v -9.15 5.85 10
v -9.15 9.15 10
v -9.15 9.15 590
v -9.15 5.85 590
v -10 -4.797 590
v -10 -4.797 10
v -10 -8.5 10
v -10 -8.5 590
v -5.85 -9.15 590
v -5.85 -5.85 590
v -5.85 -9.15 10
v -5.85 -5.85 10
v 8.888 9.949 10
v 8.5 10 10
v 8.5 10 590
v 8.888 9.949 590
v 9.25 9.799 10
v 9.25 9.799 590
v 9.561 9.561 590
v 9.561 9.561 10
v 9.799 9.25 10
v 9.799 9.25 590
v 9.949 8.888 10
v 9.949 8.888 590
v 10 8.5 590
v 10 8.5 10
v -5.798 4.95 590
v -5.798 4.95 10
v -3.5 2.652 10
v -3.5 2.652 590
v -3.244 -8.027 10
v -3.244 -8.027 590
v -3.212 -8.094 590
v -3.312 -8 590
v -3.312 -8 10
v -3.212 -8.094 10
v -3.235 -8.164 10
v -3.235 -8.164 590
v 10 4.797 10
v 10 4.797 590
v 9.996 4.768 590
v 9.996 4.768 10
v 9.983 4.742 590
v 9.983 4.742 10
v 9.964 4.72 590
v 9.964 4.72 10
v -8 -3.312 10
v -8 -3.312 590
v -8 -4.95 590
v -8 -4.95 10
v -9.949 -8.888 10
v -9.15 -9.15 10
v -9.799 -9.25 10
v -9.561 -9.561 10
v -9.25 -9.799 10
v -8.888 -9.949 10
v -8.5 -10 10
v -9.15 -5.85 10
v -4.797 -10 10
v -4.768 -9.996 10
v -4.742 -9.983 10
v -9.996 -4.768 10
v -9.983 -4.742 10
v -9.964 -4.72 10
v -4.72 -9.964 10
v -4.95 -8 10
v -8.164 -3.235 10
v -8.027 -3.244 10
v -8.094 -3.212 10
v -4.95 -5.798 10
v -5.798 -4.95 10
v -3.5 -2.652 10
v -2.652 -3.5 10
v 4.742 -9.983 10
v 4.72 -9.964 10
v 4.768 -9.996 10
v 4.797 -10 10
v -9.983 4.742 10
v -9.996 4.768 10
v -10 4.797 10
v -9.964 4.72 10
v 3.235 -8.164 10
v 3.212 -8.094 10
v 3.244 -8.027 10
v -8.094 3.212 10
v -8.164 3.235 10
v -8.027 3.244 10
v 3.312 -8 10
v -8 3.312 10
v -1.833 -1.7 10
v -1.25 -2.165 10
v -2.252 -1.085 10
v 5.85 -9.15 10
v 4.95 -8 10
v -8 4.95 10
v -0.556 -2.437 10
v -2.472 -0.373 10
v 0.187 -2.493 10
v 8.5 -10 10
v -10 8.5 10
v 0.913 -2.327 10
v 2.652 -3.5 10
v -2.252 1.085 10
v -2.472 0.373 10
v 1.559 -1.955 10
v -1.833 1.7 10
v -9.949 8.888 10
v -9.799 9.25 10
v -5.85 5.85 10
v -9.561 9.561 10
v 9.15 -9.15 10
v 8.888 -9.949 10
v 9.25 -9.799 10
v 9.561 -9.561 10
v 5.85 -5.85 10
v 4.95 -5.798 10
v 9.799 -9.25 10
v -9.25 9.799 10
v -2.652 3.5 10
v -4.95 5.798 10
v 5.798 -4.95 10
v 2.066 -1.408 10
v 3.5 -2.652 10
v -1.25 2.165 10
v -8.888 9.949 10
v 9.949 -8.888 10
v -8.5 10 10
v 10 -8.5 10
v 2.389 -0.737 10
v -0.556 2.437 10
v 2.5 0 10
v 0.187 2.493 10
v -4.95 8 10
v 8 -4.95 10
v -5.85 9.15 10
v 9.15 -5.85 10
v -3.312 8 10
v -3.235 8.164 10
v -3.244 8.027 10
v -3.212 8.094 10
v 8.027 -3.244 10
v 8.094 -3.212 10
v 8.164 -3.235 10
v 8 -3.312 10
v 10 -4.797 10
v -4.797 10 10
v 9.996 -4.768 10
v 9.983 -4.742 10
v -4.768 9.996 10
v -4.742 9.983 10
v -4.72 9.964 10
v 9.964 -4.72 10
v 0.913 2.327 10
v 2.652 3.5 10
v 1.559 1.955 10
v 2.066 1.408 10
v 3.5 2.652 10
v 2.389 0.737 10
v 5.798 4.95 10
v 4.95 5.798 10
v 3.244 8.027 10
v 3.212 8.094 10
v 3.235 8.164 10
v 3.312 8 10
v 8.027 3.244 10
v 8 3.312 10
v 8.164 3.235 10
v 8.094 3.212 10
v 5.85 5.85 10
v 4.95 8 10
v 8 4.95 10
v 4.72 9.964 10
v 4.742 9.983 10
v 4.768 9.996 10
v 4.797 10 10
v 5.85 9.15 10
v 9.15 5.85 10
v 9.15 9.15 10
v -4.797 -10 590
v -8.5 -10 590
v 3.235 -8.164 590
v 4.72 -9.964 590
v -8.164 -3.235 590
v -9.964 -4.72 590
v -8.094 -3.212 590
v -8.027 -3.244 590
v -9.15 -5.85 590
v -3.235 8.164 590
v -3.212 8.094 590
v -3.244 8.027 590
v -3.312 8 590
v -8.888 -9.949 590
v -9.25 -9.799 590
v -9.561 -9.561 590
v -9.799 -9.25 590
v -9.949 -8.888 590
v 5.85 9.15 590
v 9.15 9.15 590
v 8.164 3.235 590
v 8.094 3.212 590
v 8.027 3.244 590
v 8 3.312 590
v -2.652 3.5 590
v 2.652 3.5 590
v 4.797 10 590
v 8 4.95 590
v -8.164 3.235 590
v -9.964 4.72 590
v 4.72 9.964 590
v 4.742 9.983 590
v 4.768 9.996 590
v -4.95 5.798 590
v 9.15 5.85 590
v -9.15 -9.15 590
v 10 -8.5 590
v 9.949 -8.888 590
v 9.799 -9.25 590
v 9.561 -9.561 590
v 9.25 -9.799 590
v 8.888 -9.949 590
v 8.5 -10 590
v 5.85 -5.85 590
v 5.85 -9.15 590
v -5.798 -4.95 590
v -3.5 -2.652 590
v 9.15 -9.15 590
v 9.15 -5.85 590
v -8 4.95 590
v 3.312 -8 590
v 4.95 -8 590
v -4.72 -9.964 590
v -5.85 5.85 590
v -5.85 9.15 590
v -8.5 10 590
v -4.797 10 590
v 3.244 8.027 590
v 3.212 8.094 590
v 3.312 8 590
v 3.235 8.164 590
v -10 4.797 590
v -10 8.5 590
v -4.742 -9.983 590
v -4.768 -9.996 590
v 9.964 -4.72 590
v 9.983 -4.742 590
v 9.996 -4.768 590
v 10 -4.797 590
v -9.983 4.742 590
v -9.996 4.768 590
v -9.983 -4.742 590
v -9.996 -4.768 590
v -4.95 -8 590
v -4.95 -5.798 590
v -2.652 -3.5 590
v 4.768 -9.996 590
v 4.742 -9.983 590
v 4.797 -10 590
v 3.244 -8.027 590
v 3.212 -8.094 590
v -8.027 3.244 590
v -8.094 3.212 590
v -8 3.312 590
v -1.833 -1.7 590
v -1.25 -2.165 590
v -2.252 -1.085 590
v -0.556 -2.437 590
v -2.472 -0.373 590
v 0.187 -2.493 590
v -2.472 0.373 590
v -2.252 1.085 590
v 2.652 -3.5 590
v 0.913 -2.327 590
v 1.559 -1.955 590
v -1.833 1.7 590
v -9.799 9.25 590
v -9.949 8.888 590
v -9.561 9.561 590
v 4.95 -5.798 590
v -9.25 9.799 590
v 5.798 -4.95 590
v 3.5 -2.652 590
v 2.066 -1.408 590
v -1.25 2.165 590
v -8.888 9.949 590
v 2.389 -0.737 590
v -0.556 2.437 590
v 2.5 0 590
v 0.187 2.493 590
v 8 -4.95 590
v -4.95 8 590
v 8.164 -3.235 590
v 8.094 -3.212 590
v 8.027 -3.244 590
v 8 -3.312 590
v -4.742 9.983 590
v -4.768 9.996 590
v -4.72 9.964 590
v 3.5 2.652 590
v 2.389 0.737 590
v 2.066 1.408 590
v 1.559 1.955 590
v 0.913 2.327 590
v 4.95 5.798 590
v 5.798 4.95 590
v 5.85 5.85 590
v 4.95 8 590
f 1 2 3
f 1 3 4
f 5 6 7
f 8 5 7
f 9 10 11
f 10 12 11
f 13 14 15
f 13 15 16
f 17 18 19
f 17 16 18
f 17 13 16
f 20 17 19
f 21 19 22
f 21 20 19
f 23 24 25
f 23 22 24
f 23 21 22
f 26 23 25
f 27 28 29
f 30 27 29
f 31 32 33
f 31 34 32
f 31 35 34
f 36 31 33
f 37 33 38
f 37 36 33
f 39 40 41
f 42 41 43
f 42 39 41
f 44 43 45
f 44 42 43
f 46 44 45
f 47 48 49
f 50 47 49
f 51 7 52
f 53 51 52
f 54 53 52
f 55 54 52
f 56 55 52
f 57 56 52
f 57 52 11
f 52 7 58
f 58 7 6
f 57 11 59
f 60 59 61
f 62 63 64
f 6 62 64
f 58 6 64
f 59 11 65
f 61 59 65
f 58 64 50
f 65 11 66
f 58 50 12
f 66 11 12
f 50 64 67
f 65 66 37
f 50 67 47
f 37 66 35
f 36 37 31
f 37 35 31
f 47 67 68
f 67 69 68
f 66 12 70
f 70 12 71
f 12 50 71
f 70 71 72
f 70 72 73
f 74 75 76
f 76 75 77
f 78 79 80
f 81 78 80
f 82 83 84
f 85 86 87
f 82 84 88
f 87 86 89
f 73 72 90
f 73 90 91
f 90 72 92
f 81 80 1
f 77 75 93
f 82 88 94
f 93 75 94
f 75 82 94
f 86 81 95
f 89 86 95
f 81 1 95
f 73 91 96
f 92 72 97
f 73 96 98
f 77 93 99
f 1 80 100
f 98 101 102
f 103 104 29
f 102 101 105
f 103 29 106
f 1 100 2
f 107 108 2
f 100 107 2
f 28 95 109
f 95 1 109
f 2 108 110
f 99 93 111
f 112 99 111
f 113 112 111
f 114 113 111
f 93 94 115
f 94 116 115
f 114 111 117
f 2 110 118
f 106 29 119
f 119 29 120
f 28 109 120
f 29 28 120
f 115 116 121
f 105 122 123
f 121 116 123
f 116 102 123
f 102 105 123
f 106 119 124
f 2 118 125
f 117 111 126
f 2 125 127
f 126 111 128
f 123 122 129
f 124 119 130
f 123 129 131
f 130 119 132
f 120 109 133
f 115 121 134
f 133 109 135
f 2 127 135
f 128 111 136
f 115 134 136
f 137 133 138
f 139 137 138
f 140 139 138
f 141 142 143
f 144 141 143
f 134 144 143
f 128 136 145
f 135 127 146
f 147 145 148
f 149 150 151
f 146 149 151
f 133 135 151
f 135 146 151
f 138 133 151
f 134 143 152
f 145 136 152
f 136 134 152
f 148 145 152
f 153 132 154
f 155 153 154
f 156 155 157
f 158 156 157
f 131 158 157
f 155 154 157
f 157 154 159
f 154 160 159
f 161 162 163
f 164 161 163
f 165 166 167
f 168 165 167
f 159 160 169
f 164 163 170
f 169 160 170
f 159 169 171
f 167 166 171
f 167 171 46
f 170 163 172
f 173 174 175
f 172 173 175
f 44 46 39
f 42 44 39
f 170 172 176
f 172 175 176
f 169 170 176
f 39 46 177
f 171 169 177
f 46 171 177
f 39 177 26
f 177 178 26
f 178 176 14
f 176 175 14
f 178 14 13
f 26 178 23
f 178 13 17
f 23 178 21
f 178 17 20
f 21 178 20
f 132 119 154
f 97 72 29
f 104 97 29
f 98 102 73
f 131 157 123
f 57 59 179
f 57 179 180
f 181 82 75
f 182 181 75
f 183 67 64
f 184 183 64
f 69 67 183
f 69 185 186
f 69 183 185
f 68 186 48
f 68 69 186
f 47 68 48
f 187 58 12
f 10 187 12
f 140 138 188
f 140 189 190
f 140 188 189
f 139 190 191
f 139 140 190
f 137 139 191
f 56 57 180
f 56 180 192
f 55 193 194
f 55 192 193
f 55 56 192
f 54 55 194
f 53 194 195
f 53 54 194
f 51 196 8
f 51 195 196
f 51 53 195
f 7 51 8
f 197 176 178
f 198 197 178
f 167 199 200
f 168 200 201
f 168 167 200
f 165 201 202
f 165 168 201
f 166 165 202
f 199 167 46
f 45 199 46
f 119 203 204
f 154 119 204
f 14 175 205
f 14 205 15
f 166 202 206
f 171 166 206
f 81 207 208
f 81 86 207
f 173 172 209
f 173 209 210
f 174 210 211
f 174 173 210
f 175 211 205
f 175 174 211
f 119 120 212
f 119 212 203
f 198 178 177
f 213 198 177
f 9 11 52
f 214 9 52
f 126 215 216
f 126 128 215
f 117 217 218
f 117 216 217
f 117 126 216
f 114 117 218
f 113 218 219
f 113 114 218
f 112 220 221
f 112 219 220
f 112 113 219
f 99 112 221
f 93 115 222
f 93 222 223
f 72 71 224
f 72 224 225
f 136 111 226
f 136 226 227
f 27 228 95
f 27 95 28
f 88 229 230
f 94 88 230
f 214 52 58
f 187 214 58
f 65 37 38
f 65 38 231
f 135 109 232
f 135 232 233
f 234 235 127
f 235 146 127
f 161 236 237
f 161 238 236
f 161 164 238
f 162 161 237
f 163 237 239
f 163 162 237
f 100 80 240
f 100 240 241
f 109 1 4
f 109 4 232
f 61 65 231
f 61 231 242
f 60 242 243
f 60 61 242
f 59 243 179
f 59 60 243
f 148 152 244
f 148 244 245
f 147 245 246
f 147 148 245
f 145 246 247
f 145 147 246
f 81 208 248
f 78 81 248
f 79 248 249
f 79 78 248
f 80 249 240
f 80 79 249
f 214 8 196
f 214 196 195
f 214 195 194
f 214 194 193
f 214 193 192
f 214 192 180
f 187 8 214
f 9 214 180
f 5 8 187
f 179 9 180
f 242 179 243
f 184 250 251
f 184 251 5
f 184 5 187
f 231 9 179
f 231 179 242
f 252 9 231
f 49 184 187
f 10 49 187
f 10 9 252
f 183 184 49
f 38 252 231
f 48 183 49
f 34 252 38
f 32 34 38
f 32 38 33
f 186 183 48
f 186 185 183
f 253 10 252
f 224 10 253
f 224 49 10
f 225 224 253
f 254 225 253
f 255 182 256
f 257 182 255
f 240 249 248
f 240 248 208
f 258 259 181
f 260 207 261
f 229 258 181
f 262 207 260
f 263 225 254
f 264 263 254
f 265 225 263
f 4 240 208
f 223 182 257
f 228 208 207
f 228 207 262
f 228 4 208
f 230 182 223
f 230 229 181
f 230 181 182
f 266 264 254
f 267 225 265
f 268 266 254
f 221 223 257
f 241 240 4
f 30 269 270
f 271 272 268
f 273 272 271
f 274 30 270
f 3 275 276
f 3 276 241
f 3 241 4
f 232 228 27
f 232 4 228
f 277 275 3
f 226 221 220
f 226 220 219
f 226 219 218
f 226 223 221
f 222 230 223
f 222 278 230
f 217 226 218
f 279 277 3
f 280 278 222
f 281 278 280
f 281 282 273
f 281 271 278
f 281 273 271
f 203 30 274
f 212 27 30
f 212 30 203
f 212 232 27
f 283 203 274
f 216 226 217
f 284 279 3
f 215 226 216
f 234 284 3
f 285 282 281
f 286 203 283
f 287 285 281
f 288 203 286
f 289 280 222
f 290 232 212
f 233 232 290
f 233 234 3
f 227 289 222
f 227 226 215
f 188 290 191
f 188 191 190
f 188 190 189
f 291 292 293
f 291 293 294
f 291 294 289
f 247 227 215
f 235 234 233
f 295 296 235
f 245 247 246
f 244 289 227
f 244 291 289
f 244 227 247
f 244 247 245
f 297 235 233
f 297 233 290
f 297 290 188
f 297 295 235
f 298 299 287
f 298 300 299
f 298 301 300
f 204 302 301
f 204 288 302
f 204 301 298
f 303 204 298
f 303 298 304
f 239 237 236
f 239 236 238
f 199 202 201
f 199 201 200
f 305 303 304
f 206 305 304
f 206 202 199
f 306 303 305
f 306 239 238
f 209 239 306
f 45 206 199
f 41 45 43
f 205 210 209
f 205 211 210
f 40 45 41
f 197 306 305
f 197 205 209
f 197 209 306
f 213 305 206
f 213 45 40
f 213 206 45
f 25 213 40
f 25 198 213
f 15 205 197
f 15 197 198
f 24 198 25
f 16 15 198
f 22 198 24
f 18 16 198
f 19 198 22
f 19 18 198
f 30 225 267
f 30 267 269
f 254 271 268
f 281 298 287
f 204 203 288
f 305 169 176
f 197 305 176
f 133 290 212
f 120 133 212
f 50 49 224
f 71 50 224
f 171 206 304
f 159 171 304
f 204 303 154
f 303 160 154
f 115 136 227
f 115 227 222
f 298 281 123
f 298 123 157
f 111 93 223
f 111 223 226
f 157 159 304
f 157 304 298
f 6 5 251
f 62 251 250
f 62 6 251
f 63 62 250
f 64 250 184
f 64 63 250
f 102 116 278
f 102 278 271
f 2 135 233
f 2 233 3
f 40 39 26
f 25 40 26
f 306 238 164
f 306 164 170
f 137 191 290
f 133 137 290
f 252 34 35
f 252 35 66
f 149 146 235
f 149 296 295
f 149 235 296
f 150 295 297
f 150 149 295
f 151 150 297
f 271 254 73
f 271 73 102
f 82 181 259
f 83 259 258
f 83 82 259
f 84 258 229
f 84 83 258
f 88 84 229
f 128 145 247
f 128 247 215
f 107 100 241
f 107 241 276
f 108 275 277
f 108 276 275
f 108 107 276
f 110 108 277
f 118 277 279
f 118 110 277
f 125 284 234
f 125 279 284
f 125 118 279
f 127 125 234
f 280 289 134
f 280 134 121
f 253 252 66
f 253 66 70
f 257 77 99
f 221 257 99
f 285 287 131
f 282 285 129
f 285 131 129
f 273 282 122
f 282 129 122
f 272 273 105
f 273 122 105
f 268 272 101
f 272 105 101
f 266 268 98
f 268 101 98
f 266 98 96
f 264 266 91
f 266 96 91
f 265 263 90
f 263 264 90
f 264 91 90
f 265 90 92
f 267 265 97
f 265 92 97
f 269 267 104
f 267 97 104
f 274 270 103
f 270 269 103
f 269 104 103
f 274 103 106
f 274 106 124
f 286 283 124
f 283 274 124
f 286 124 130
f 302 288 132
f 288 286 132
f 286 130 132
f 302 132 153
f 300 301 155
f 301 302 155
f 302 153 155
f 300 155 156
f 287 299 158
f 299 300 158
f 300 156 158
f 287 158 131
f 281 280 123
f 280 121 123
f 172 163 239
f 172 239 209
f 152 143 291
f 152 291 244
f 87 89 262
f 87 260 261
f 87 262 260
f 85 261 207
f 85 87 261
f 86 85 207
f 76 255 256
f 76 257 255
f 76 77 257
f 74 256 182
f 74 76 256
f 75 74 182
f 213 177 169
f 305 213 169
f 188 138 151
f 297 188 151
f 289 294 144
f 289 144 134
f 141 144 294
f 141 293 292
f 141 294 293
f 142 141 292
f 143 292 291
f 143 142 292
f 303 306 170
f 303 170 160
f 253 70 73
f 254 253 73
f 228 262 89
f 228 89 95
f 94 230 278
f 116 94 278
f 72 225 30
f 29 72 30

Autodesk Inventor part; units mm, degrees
ref_plane "Начальная плоскость" through (0, 0, 10) normal (0, 0, 1) x (1, 0, 0)
ref_plane "Конечная плоскость" through (0, 0, 590) normal (0, 0, 1) x (1, 0, 0)
sketch "Эскиз" plane through (0, 0, 0) normal (0, 0, 1) x (1, 0, 0)
  line L0 (-14.4349, 0) -> (14.4349, 0) projected
  line L1 (0, -14) -> (0, 14) projected
  line L2 (0, 0) -> (7.5, 7.5) construction
  circle A0 centre (7.5, 7.5) radius 1.65 construction
  line L3 (5.85, 9.15) -> (9.15, 9.15)
  line L4 (9.15, 9.15) -> (9.15, 5.85)
  line L5 (9.15, 5.85) -> (5.85, 5.85)
  line L6 (5.85, 5.85) -> (5.85, 9.15)
  line L7 (3.235, 8.1636) -> (4.72, 9.9636)
  line L8 (4.7971, 10) -> (8.5, 10)
  line L9 (3.3121, 8) -> (4.95, 8)
  line L10 (4.95, 8) -> (4.95, 5.7985)
  line L11 (4.95, 5.7985) -> (2.6515, 3.5)
  line L12 (0, 3.5) -> (2.6515, 3.5)
  circle A1 centre (0, 0) radius 2.5
  line L13 (8.1636, 3.235) -> (9.9636, 4.72)
  line L14 (10, 4.7971) -> (10, 8.5)
  line L15 (8, 3.3121) -> (8, 4.95)
  line L16 (8, 4.95) -> (5.7985, 4.95)
  line L17 (5.7985, 4.95) -> (3.5, 2.6515)
  line L18 (3.5, 0) -> (3.5, 2.6515)
  arc A2 (10, 8.5) -> (8.5, 10) centre (8.5, 8.5) ccw
  line L19 (0, 0) -> (-7.5, 7.5) construction
  circle A3 centre (-7.5, 7.5) radius 1.65 construction
  line L20 (-5.85, 9.15) -> (-9.15, 9.15)
  line L21 (-9.15, 9.15) -> (-9.15, 5.85)
  line L22 (-9.15, 5.85) -> (-5.85, 5.85)
  line L23 (-5.85, 5.85) -> (-5.85, 9.15)
  line L24 (-3.235, 8.1636) -> (-4.72, 9.9636)
  line L25 (-4.7971, 10) -> (-8.5, 10)
  line L26 (-3.3121, 8) -> (-4.95, 8)
  line L27 (-4.95, 8) -> (-4.95, 5.7985)
  line L28 (-4.95, 5.7985) -> (-2.6515, 3.5)
  line L29 (0, 3.5) -> (-2.6515, 3.5)
  line L30 (-3.5, 0) -> (-3.5, 2.6515)
  line L31 (-5.7985, 4.95) -> (-3.5, 2.6515)
  line L32 (-8, 4.95) -> (-5.7985, 4.95)
  line L33 (-8, 3.3121) -> (-8, 4.95)
  line L34 (-8.1636, 3.235) -> (-9.9636, 4.72)
  line L35 (-10, 4.7971) -> (-10, 8.5)
  arc A4 (-8.5, 10) -> (-10, 8.5) centre (-8.5, 8.5) ccw
  line L36 (0, 14) -> (0, -14)
  line L37 (0, 0) -> (7.5, -7.5) construction
  circle A5 centre (7.5, -7.5) radius 1.65 construction
  line L38 (5.85, -9.15) -> (9.15, -9.15)
  line L39 (9.15, -9.15) -> (9.15, -5.85)
  line L40 (9.15, -5.85) -> (5.85, -5.85)
  line L41 (5.85, -5.85) -> (5.85, -9.15)
  line L42 (3.235, -8.1636) -> (4.72, -9.9636)
  line L43 (4.7971, -10) -> (8.5, -10)
  line L44 (3.3121, -8) -> (4.95, -8)
  line L45 (4.95, -8) -> (4.95, -5.7985)
  line L46 (4.95, -5.7985) -> (2.6515, -3.5)
  line L47 (0, -3.5) -> (2.6515, -3.5)
  line L48 (3.5, 0) -> (3.5, -2.6515)
  line L49 (5.7985, -4.95) -> (3.5, -2.6515)
  line L50 (8, -4.95) -> (5.7985, -4.95)
  line L51 (8, -3.3121) -> (8, -4.95)
  line L52 (8.1636, -3.235) -> (9.9636, -4.72)
  line L53 (10, -4.7971) -> (10, -8.5)
  arc A6 (8.5, -10) -> (10, -8.5) centre (8.5, -8.5) ccw
  line L54 (0, 0) -> (-7.5, -7.5) construction
  line L55 (-4.95, -8) -> (-4.95, -5.7985)
  line L56 (-3.3121, -8) -> (-4.95, -8)
  line L57 (-5.7985, -4.95) -> (-3.5, -2.6515)
  line L58 (-4.95, -5.7985) -> (-2.6515, -3.5)
  line L59 (-3.5, 0) -> (-3.5, -2.6515)
  line L60 (0, -3.5) -> (-2.6515, -3.5)
  circle A7 centre (-7.5, -7.5) radius 1.65 construction
  line L61 (-5.85, -5.85) -> (-5.85, -9.15)
  line L62 (-5.85, -9.15) -> (-9.15, -9.15)
  line L63 (-9.15, -9.15) -> (-9.15, -5.85)
  line L64 (-9.15, -5.85) -> (-5.85, -5.85)
  line L65 (-3.235, -8.1636) -> (-4.72, -9.9636)
  line L66 (-8, -4.95) -> (-5.7985, -4.95)
  line L67 (-8, -3.3121) -> (-8, -4.95)
  line L68 (-8.1636, -3.235) -> (-9.9636, -4.72)
  line L69 (-4.7971, -10) -> (-8.5, -10)
  line L70 (-10, -4.7971) -> (-10, -8.5)
  arc A8 (-10, -8.5) -> (-8.5, -10) centre (-8.5, -8.5) ccw
  arc A9 (3.235, 8.1636) -> (3.3121, 8) centre (3.3121, 8.1) ccw
  arc A10 (4.7971, 10) -> (4.72, 9.9636) centre (4.7971, 9.9) ccw
  arc A11 (8, 3.3121) -> (8.1636, 3.235) centre (8.1, 3.3121) ccw
  arc A12 (9.9636, 4.72) -> (10, 4.7971) centre (9.9, 4.7971) ccw
  arc A13 (-3.3121, 8) -> (-3.235, 8.1636) centre (-3.3121, 8.1) ccw
  arc A14 (-4.72, 9.9636) -> (-4.7971, 10) centre (-4.7971, 9.9) ccw
  arc A15 (-8.1636, 3.235) -> (-8, 3.3121) centre (-8.1, 3.3121) ccw
  arc A16 (-10, 4.7971) -> (-9.9636, 4.72) centre (-9.9, 4.7971) ccw
  arc A17 (-8, -3.3121) -> (-8.1636, -3.235) centre (-8.1, -3.3121) ccw
  arc A18 (-9.9636, -4.72) -> (-10, -4.7971) centre (-9.9, -4.7971) ccw
  arc A19 (-3.235, -8.1636) -> (-3.3121, -8) centre (-3.3121, -8.1) ccw
  arc A20 (-4.7971, -10) -> (-4.72, -9.9636) centre (-4.7971, -9.9) ccw
  arc A21 (4.72, -9.9636) -> (4.7971, -10) centre (4.7971, -9.9) ccw
  arc A22 (3.3121, -8) -> (3.235, -8.1636) centre (3.3121, -8.1) ccw
  arc A23 (8.1636, -3.235) -> (8, -3.3121) centre (8.1, -3.3121) ccw
  arc A24 (10, -4.7971) -> (9.9636, -4.72) centre (9.9, -4.7971) ccw
  point P0 (3.1, 8)
  point P1 (4.75, 10)
  point P2 (7.5, 9.15)
  point P3 (8, 3.1)
  point P4 (10, 4.75)
  point P5 (7.5, 5.85)
  point P6 (9.15, 7.5)
  point P7 (-3.1, 8)
  point P8 (-4.75, 10)
  point P9 (-7.5, 9.15)
  point P10 (-8, 3.1)
  point P11 (-10, 4.75)
  point P12 (-7.5, 5.85)
  point P13 (-9.15, 7.5)
  point P14 (3.1, -8)
  point P15 (4.75, -10)
  point P16 (7.5, -9.15)
  point P17 (8, -3.1)
  point P18 (10, -4.75)
  point P19 (7.5, -5.85)
  point P20 (9.15, -7.5)
  point P21 (-3.1, -8)
  point P22 (-7.5, -5.85)
  point P23 (-7.5, -9.15)
  point P24 (-9.15, -7.5)
  point P25 (-4.75, -10)
  point P26 (-8, -3.1)
  point P27 (-10, -4.75)
  dimension "d0" = 45
  dimension "d1" = 3.3
  dimension "d2" = 1.5
  dimension "d3" = 1.2
  dimension "d4" = 5
  dimension "d5" = 6.5
  dimension "d6" = 15
  dimension "d7" = 20
  dimension "d8" = 9.9
  dimension "d9" = 9.5
  dimension "d10" = 6.2
  dimension "d11" = 2
  dimension "d18" = 0.1
  dimension "d19" = 0.1
extrude "Тело" add sketch "Эскиз" along normal up to surface (580 mm away) from surface at 10 contours A1 L1 L12 L11 L10 L9 A9 L7 A10 L8 A2 L14 A12 L13 A11 L15 L16 L17 L18 L0 | L0 L48 L49 L50 L51 A23 L52 A24 L53 A6 L43 A21 L42 A22 L44 L45 L46 L47 L1 A1 | A1 L0 L30 L31 L32 L33 A15 L34 A16 L35 A4 L25 A14 L24 A13 L26 L27 L28 L29 L1 | L1 L60 L58 L55 L56 A19 L65 A20 L69 A8 L70 A18 L68 A17 L67 L66 L57 L59 L0 A1
sketch "Эскиз2" plane through (0, 0, 0) normal (0, 0, 1) x (1, 0, 0)
  line L0 (0, 0) -> (10, 0)
ref_plane "РабПлоскость3" through (0, 0, 0) normal (0, -1, 0) x (1, 0, 0)
sketch "Эскиз3" plane through (0, 0, 0) normal (0, -1, 0) x (1, 0, 0)
  line L0 (-2, 10) -> (12, 10)
  line L1 (-2, 590) -> (12, 590)
  dimension "d25" = 580
ref_plane "РабПлоскость5" through (281.5, 0, 10) normal (0, 0, -1) x (-1, 0, 0)
split "Разделение2" plane through (281.5, 0, 10) removes the side toward (0, 0, -1)
ref_plane "РабПлоскость6" through (0, 0, 10) normal (0, 0, -1) x (-1, 0, 0)
split "Разделение3" plane through (0, 0, 10) removes the side toward (0, 0, -1)
ref_plane "РабПлоскость7" through (0, 0, 590) normal (0, 0, 1) x (1, 0, 0)
split "Разделение4" plane through (0, 0, 590) removes the side toward (0, 0, 1)
ref_plane "РабПлоскость8" through (0, 10, 610) normal (0, 0, 1) x (1, 0, 0)
split "Разделение5" plane through (0, 10, 610) removes the side toward (0, 0, 1)
properties part number "короткая палка"
